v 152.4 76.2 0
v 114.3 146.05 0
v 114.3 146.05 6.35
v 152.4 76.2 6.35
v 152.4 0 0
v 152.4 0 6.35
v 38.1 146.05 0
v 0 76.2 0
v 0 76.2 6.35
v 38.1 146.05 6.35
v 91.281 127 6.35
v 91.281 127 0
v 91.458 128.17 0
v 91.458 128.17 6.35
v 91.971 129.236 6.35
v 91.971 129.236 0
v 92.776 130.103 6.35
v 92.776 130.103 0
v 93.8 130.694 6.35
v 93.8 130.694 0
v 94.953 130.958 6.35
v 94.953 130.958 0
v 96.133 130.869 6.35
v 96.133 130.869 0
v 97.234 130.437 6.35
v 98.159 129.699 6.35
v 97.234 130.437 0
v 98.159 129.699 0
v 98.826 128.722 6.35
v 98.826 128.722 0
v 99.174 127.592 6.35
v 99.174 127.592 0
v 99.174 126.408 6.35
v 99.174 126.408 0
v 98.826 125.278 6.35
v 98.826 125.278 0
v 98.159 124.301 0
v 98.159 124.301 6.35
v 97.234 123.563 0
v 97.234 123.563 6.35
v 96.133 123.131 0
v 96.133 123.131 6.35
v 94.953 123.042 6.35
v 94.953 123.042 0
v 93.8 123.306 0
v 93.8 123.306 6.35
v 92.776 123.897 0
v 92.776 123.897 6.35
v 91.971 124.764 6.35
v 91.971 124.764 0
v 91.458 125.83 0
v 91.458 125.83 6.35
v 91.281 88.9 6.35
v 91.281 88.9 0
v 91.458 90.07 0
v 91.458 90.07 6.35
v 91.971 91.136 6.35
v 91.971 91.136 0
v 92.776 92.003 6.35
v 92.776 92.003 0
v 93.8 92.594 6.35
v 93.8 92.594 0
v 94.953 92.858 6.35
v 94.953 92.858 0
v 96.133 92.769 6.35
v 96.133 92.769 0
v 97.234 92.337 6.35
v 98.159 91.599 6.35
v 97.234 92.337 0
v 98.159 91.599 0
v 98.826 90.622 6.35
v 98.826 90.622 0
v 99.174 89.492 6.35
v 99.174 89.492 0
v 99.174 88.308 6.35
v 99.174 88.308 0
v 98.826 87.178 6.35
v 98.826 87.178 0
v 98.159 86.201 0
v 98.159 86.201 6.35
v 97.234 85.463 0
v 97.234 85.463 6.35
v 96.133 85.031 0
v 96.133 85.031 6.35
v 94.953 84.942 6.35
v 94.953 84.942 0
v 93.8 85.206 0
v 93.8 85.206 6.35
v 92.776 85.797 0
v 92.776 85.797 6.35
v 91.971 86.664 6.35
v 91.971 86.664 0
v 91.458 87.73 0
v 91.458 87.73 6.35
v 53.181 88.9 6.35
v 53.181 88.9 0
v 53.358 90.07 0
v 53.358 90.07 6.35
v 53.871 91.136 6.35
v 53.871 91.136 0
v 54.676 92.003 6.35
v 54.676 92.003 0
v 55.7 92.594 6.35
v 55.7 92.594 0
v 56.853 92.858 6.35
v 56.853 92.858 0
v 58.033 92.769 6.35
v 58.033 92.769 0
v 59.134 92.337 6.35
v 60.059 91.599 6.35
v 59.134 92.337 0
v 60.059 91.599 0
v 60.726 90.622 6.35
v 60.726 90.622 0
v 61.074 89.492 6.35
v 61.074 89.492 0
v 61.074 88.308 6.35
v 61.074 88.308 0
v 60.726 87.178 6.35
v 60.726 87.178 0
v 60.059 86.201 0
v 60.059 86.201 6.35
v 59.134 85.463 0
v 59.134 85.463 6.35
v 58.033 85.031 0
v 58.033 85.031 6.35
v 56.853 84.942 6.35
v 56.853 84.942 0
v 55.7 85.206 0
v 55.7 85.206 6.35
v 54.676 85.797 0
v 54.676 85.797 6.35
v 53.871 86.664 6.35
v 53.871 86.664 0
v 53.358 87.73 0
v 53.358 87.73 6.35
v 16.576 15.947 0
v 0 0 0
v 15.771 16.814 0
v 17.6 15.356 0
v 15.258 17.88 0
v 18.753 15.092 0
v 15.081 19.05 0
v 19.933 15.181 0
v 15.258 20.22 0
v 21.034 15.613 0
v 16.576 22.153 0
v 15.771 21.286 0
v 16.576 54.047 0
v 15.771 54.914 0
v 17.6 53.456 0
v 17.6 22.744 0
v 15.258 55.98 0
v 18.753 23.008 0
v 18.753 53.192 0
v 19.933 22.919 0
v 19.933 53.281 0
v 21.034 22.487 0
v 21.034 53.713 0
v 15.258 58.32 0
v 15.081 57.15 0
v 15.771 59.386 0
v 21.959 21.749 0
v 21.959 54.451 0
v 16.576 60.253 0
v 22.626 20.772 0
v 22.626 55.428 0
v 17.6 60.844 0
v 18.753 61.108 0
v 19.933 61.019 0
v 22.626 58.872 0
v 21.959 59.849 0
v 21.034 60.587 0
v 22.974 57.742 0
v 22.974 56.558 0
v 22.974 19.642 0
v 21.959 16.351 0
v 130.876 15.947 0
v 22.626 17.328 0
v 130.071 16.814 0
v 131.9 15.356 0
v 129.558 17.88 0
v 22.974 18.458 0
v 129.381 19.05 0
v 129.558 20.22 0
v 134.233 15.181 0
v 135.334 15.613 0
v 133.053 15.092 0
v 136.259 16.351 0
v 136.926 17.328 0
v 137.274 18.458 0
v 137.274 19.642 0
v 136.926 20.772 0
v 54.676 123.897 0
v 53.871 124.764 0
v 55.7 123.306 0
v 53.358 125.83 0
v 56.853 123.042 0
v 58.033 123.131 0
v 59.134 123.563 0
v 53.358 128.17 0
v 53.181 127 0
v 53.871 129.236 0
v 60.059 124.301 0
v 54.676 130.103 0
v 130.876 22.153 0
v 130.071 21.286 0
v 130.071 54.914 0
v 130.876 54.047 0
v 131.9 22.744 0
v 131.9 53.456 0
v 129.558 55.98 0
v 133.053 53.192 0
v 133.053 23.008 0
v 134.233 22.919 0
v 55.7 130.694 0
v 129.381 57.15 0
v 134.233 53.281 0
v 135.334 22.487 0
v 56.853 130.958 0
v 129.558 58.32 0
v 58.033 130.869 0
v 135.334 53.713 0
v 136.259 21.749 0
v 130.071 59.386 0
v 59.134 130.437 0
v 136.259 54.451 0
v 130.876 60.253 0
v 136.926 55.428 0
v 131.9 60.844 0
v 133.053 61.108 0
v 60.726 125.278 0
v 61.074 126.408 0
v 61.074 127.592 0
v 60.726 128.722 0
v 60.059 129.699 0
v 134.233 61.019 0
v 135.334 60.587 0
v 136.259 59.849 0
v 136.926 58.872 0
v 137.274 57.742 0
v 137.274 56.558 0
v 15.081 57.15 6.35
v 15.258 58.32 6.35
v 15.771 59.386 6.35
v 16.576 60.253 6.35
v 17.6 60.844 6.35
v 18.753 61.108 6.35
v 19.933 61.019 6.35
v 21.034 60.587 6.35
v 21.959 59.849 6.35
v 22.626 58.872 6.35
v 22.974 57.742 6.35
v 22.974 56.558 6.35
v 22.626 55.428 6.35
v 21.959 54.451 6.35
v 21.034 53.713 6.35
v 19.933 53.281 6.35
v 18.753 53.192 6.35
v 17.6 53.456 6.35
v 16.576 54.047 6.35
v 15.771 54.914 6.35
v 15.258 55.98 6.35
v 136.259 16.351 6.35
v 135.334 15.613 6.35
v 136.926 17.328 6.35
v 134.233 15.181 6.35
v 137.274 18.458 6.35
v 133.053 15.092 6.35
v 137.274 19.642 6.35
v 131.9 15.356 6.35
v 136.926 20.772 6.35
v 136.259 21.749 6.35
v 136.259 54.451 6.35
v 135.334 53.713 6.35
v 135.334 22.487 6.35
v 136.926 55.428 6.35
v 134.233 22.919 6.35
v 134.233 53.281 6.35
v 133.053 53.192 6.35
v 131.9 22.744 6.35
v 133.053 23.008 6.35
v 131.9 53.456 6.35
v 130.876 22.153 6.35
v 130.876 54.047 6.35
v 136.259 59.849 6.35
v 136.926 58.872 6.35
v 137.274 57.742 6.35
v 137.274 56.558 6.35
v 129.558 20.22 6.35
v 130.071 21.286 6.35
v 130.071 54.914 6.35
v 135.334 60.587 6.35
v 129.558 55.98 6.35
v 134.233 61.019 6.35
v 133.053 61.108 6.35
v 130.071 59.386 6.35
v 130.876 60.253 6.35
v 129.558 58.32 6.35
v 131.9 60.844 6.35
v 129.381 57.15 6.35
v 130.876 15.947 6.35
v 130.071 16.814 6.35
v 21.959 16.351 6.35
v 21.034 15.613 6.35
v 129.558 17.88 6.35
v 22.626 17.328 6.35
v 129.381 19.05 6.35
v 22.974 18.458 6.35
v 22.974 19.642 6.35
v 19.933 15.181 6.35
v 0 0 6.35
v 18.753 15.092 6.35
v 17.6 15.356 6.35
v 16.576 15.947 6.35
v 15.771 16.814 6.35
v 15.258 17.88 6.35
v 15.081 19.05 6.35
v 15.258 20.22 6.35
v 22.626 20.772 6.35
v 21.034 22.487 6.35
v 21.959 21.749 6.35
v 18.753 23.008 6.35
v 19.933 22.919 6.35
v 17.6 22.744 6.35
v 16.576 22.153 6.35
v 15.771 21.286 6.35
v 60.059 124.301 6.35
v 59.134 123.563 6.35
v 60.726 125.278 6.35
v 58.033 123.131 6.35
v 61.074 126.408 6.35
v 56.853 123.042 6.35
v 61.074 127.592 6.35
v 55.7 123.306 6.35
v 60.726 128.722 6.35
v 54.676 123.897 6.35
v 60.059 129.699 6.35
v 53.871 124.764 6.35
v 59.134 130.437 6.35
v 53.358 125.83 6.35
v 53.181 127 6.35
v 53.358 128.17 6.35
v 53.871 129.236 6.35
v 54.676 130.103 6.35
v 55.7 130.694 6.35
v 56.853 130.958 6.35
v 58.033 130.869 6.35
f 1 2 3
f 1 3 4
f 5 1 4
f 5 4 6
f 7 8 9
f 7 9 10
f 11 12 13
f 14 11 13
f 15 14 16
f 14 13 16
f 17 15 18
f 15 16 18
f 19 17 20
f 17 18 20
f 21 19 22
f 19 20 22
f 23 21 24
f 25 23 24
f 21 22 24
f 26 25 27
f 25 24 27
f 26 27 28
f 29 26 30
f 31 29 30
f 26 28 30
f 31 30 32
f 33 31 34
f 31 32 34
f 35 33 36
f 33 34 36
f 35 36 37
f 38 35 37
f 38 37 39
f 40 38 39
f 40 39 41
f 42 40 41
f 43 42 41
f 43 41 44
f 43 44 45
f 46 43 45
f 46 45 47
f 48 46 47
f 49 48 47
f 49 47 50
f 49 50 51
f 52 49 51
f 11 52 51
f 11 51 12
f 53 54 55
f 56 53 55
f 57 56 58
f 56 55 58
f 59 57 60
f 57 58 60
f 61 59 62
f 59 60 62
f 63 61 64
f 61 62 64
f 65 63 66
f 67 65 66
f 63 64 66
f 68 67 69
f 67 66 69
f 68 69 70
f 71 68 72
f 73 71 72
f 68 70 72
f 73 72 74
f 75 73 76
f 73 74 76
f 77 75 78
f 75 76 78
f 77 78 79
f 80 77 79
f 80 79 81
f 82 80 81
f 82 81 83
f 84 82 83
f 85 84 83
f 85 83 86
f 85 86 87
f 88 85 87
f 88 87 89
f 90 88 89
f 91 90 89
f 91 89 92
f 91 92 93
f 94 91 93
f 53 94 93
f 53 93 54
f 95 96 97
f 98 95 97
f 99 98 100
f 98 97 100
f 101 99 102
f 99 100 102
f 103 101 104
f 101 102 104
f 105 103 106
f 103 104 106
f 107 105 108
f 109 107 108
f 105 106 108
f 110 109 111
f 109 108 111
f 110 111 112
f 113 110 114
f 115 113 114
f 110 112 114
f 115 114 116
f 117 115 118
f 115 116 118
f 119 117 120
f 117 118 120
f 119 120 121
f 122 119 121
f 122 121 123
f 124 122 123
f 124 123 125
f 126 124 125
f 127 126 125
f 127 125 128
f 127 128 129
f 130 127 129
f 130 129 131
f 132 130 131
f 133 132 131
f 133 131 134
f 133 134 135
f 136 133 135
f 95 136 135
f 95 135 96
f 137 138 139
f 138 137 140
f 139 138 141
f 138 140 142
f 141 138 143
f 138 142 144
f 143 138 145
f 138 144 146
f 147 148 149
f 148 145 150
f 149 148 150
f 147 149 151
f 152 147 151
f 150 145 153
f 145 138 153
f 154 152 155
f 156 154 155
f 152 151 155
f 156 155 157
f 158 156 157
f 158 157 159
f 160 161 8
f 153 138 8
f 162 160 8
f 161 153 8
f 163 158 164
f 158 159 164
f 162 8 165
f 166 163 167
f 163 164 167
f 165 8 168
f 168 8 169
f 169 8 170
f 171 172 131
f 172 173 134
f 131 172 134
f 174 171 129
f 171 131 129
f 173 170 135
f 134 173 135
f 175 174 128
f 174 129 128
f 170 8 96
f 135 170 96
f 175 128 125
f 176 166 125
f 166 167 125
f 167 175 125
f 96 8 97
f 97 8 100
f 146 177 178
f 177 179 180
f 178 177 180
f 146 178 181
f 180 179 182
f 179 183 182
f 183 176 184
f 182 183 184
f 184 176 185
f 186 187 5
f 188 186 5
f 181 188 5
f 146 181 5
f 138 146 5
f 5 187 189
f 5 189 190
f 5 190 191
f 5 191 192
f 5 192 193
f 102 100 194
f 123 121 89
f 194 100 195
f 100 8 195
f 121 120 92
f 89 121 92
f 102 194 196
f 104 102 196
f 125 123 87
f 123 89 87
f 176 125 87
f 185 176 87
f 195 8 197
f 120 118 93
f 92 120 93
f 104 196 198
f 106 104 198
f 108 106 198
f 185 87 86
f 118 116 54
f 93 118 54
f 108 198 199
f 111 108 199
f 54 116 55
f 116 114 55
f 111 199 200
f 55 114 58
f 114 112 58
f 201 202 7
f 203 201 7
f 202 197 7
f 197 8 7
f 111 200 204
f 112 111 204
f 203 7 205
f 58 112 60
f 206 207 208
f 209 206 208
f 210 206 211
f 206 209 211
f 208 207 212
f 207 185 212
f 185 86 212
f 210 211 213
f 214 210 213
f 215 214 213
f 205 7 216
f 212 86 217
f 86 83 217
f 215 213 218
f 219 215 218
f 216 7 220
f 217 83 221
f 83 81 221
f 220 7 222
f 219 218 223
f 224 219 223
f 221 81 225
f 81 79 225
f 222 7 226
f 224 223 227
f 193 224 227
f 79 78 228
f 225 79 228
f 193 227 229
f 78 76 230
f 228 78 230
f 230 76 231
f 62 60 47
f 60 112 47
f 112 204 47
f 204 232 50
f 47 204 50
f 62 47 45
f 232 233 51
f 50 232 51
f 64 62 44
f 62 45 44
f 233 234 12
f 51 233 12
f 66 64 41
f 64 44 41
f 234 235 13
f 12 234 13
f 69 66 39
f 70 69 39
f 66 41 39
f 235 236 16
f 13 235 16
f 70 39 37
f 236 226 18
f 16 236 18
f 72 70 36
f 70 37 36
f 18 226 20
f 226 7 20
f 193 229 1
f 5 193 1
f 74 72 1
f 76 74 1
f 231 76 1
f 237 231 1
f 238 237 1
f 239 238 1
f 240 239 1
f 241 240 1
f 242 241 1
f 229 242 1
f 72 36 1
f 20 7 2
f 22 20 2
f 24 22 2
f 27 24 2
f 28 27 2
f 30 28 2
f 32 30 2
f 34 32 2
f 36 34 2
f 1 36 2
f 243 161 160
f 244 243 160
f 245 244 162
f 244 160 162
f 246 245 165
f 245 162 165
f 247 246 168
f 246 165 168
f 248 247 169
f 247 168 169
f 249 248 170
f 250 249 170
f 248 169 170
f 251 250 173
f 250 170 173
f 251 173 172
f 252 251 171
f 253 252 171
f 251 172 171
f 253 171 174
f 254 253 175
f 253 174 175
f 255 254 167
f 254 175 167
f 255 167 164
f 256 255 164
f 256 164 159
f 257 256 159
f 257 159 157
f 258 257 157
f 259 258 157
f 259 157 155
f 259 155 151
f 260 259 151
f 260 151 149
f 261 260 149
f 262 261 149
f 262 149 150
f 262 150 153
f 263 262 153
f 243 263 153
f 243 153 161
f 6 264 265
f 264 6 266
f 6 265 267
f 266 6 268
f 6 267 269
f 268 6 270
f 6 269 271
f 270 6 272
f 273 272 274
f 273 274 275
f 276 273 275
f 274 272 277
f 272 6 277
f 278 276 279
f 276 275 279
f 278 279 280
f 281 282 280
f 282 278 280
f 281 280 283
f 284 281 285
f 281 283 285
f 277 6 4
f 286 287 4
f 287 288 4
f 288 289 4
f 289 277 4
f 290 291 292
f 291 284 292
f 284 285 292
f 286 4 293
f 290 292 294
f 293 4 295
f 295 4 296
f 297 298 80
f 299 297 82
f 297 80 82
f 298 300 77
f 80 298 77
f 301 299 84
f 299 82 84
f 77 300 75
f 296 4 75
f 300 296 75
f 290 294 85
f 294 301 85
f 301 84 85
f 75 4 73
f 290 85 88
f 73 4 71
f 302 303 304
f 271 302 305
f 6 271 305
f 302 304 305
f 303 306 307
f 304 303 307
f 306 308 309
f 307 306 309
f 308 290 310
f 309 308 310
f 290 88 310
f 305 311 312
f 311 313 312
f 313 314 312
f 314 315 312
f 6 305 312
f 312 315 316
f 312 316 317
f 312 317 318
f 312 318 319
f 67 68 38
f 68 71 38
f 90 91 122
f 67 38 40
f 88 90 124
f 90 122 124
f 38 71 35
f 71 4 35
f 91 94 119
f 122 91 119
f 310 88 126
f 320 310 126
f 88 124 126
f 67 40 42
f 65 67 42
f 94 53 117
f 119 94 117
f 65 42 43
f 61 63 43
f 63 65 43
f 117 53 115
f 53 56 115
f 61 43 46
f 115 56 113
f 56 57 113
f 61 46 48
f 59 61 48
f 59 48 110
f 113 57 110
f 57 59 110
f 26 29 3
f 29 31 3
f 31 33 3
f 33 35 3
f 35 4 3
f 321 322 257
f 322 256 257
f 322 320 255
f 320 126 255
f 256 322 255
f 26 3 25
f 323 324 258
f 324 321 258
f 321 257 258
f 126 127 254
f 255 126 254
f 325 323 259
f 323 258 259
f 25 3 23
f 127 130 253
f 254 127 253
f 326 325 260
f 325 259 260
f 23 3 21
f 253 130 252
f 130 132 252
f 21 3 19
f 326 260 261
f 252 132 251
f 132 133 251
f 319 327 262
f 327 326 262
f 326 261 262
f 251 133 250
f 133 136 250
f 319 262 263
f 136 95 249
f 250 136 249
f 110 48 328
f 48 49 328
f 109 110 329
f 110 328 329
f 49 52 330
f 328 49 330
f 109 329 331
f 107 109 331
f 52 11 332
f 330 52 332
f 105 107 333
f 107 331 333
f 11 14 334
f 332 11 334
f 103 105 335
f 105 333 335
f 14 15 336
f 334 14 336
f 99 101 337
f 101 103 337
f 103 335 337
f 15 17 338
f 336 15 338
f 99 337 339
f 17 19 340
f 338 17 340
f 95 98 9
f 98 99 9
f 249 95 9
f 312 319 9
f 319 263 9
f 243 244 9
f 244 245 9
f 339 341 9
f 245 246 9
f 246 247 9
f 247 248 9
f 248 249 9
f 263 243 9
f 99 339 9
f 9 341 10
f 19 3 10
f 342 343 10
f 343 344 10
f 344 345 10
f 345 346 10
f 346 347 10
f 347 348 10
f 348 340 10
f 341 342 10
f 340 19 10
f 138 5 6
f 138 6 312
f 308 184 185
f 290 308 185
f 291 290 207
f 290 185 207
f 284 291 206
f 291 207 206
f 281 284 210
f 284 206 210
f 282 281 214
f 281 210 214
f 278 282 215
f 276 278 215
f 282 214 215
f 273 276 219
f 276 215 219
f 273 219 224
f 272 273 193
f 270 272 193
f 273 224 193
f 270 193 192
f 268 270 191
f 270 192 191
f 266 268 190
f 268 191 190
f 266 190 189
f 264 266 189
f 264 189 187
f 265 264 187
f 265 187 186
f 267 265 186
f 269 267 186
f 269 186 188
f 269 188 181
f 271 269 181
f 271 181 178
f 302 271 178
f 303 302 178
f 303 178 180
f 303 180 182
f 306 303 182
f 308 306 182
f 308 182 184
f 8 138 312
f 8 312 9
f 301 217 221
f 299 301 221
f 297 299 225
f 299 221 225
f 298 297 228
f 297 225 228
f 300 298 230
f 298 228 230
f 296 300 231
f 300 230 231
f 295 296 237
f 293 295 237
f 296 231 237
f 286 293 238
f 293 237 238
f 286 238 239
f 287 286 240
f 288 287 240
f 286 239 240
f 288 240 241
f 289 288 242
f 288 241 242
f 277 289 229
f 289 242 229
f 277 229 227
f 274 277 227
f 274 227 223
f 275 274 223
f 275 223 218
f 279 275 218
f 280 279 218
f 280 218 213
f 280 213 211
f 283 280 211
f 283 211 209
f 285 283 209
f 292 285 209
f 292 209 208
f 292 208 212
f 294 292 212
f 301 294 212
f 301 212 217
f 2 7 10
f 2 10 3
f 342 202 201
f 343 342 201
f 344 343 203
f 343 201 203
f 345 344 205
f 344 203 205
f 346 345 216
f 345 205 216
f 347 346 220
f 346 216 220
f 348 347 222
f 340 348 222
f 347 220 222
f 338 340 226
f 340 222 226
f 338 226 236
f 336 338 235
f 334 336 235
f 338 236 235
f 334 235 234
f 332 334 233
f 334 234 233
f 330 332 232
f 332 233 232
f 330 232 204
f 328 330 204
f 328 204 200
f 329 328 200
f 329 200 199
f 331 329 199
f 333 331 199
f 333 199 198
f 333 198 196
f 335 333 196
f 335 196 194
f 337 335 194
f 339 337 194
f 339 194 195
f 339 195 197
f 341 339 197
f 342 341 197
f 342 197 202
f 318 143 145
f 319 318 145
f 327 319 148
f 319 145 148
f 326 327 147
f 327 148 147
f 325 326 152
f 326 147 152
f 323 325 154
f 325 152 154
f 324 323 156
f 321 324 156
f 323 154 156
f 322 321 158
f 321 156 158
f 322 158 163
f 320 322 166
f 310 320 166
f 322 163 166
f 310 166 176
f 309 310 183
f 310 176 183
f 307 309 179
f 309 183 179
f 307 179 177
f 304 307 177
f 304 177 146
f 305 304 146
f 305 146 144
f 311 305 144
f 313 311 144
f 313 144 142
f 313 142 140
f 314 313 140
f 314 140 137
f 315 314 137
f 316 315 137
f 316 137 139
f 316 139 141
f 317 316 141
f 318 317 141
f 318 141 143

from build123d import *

# Parameters (mm, degrees)
SKETCH1_W                      = 38.1
SKETCH1_H                      = 38.1
SKETCH1_W_2                    = 114.3
BOSS_EXTRUDE1_DEPTH            = 6.35
F_5_16_0_3125_DIAMETER_HOLE1_D = 7.9375


with BuildPart() as part:
    # Sketch1 → Boss-Extrude1 (new body)
    # profile 1 of 3: a face of its own
    with BuildSketch(Plane.XY):
        Polygon((152.4, 0), (0, 0), (0, 76.2), (38.1, 146.05), (114.3, 146.05), (152.4, 76.2), align=None)
        with Locations((76.2, 107.95)):
            Rectangle(SKETCH1_W, SKETCH1_H, mode=Mode.SUBTRACT)
        with Locations((76.2, 38.1)):
            Rectangle(SKETCH1_W_2, SKETCH1_H, mode=Mode.SUBTRACT)
    # profile 2 of 3: a face of its own
    with BuildSketch(Plane.XY):
        with Locations((76.2, 107.95)):
            Rectangle(SKETCH1_W, SKETCH1_H)
    # profile 3 of 3: a face of its own
    with BuildSketch(Plane.XY):
        with Locations((76.2, 38.1)):
            Rectangle(SKETCH1_W_2, SKETCH1_H)
    extrude(amount=BOSS_EXTRUDE1_DEPTH)

    # 5/16 (0.3125) Diameter Hole1 (through all)
    with Locations(Plane.XY.offset(6.35)):
        with Locations((19.05, 19.05), (19.05, 57.15), (57.15, 88.9), (57.15, 127), (95.25, 127), (95.25, 88.9), (133.35, 57.15), (133.35, 19.05)):
            Hole(F_5_16_0_3125_DIAMETER_HOLE1_D / 2)


solid = part.part
